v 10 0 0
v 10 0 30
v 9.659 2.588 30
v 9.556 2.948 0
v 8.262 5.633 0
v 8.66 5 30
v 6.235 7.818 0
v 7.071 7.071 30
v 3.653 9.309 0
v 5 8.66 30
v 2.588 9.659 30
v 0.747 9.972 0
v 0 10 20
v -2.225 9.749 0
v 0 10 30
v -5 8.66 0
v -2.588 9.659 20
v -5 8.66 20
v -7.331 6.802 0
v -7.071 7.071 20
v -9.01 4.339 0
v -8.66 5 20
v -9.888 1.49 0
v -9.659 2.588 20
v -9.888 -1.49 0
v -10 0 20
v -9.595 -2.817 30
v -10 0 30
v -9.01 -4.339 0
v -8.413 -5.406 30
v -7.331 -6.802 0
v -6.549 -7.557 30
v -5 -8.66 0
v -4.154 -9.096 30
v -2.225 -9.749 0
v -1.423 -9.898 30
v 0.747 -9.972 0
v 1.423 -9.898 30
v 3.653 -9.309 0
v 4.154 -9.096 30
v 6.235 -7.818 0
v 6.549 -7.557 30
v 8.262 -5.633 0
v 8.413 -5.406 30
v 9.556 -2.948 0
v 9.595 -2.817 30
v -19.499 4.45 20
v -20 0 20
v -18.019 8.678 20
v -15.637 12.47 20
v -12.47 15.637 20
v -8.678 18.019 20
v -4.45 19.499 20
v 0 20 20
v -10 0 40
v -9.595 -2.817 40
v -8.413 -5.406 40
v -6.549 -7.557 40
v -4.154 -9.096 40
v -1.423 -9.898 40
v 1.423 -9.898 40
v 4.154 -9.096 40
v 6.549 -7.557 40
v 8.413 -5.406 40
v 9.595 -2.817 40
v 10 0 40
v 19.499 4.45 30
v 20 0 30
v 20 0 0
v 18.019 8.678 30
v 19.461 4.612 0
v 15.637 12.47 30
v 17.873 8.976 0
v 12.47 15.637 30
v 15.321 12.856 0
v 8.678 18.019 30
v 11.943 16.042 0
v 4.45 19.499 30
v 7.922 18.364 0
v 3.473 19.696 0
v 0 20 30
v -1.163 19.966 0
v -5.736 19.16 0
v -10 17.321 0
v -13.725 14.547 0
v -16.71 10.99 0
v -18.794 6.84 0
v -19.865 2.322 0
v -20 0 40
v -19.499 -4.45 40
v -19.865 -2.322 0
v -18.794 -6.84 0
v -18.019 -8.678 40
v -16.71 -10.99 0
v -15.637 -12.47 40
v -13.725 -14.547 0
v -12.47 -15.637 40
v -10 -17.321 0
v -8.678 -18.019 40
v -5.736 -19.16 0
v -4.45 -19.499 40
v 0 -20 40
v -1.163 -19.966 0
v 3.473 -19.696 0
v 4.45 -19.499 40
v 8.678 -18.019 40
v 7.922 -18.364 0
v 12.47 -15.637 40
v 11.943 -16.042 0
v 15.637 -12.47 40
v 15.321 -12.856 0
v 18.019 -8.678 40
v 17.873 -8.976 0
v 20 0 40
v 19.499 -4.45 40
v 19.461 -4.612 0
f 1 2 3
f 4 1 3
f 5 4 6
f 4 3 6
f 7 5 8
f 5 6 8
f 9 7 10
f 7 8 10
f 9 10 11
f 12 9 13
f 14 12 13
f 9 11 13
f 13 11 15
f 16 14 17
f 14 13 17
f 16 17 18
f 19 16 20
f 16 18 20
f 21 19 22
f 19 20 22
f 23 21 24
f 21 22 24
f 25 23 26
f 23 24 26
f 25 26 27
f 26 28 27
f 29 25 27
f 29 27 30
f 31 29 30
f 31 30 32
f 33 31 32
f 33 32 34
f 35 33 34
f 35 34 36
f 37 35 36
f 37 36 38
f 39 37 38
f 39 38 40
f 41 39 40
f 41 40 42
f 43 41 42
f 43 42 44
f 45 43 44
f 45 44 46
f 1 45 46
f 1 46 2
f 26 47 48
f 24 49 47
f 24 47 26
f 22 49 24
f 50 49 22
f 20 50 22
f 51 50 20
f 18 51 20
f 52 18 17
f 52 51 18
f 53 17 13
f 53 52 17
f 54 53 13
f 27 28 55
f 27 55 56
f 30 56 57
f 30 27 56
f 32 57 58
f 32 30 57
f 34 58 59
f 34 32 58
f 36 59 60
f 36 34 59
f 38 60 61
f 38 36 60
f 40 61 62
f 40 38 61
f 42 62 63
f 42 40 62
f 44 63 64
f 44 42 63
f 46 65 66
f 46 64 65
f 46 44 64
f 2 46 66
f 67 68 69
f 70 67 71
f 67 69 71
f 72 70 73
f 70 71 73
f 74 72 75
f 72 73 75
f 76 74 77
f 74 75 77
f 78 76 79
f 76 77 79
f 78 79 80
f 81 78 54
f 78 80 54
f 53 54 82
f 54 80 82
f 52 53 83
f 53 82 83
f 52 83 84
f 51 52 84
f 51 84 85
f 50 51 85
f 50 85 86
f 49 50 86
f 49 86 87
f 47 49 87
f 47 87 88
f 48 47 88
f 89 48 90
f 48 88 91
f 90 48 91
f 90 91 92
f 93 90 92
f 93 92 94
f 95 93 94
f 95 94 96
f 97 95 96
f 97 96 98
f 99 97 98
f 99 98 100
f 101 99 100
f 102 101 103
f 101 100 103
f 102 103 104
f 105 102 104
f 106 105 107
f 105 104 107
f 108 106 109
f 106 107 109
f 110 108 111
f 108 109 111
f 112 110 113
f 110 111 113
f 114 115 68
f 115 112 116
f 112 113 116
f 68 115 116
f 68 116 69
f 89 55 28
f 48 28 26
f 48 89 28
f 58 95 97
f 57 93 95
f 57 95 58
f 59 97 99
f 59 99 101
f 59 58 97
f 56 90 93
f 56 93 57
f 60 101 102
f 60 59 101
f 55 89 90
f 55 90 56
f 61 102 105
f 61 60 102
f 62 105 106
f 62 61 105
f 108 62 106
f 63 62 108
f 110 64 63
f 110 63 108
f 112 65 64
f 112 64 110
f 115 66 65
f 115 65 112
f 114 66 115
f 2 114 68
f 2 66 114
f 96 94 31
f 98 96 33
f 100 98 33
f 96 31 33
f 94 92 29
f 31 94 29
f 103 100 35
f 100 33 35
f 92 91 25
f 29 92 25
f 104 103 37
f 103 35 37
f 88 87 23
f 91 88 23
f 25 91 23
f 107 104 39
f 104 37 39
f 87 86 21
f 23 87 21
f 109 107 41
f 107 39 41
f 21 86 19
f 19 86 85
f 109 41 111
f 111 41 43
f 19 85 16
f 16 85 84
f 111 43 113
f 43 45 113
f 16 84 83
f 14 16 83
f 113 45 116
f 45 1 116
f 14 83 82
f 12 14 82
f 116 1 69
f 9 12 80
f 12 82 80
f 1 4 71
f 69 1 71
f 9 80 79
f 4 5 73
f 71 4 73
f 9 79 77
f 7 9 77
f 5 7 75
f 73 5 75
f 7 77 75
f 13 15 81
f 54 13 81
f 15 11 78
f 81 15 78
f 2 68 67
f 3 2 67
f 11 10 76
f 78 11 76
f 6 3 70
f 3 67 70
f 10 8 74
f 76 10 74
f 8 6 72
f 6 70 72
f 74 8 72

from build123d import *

# Parameters (mm, degrees)
SKETCH1_R               = 20
BOSS_EXTRUDE1_DEPTH     = 40
CUT_EXTRUDE1_DEPTH      = 40
CUT_EXTRUDE1_DEPTH_BACK = 40
SKETCH2_W               = 10
SKETCH2_H               = 20
CUT_EXTRUDE2_DEPTH      = 40
CUT_EXTRUDE2_DEPTH_BACK = 40
SKETCH3_R               = 10
CUT_EXTRUDE3_DEPTH      = 10


with BuildPart() as part:
    # Sketch1 → Boss-Extrude1 (new body)
    with BuildSketch(Plane.XY):
        Circle(SKETCH1_R)
    extrude(amount=BOSS_EXTRUDE1_DEPTH)

    # Sketch2 → Cut-Extrude1 (cut, two sides: drawn at the far end of the back side and taken through both)
    with BuildSketch(Plane(origin=(0, 0, 0), x_dir=(0, 0, -1), z_dir=(1, 0, 0)).offset(-CUT_EXTRUDE1_DEPTH_BACK)):
        with Locations((-35, 10)):
            Rectangle(SKETCH2_W, SKETCH2_H)
    extrude(amount=CUT_EXTRUDE1_DEPTH + CUT_EXTRUDE1_DEPTH_BACK, mode=Mode.SUBTRACT)

    # Sketch3 → Cut-Extrude2 (cut, two sides: drawn at the far end of the back side and taken through both)
    with BuildSketch(Plane.XY.offset(30).offset(-CUT_EXTRUDE2_DEPTH_BACK)):
        Circle(SKETCH3_R)
    extrude(amount=CUT_EXTRUDE2_DEPTH + CUT_EXTRUDE2_DEPTH_BACK, mode=Mode.SUBTRACT)

    # Sketch4 → Cut-Extrude3 (cut)
    with BuildSketch(Plane.XY.offset(30)):
        with BuildLine():
            Line((-20, 0), (-10, 0))
            ThreePointArc((-10, 0), (-7.071067812, 7.071067812), (0, 10))
            Line((0, 10), (0, 20))
            ThreePointArc((0, 20), (-14.142135624, 14.142135624), (-20, 0))
        make_face()
    extrude(amount=-CUT_EXTRUDE3_DEPTH, mode=Mode.SUBTRACT)


solid = part.part
